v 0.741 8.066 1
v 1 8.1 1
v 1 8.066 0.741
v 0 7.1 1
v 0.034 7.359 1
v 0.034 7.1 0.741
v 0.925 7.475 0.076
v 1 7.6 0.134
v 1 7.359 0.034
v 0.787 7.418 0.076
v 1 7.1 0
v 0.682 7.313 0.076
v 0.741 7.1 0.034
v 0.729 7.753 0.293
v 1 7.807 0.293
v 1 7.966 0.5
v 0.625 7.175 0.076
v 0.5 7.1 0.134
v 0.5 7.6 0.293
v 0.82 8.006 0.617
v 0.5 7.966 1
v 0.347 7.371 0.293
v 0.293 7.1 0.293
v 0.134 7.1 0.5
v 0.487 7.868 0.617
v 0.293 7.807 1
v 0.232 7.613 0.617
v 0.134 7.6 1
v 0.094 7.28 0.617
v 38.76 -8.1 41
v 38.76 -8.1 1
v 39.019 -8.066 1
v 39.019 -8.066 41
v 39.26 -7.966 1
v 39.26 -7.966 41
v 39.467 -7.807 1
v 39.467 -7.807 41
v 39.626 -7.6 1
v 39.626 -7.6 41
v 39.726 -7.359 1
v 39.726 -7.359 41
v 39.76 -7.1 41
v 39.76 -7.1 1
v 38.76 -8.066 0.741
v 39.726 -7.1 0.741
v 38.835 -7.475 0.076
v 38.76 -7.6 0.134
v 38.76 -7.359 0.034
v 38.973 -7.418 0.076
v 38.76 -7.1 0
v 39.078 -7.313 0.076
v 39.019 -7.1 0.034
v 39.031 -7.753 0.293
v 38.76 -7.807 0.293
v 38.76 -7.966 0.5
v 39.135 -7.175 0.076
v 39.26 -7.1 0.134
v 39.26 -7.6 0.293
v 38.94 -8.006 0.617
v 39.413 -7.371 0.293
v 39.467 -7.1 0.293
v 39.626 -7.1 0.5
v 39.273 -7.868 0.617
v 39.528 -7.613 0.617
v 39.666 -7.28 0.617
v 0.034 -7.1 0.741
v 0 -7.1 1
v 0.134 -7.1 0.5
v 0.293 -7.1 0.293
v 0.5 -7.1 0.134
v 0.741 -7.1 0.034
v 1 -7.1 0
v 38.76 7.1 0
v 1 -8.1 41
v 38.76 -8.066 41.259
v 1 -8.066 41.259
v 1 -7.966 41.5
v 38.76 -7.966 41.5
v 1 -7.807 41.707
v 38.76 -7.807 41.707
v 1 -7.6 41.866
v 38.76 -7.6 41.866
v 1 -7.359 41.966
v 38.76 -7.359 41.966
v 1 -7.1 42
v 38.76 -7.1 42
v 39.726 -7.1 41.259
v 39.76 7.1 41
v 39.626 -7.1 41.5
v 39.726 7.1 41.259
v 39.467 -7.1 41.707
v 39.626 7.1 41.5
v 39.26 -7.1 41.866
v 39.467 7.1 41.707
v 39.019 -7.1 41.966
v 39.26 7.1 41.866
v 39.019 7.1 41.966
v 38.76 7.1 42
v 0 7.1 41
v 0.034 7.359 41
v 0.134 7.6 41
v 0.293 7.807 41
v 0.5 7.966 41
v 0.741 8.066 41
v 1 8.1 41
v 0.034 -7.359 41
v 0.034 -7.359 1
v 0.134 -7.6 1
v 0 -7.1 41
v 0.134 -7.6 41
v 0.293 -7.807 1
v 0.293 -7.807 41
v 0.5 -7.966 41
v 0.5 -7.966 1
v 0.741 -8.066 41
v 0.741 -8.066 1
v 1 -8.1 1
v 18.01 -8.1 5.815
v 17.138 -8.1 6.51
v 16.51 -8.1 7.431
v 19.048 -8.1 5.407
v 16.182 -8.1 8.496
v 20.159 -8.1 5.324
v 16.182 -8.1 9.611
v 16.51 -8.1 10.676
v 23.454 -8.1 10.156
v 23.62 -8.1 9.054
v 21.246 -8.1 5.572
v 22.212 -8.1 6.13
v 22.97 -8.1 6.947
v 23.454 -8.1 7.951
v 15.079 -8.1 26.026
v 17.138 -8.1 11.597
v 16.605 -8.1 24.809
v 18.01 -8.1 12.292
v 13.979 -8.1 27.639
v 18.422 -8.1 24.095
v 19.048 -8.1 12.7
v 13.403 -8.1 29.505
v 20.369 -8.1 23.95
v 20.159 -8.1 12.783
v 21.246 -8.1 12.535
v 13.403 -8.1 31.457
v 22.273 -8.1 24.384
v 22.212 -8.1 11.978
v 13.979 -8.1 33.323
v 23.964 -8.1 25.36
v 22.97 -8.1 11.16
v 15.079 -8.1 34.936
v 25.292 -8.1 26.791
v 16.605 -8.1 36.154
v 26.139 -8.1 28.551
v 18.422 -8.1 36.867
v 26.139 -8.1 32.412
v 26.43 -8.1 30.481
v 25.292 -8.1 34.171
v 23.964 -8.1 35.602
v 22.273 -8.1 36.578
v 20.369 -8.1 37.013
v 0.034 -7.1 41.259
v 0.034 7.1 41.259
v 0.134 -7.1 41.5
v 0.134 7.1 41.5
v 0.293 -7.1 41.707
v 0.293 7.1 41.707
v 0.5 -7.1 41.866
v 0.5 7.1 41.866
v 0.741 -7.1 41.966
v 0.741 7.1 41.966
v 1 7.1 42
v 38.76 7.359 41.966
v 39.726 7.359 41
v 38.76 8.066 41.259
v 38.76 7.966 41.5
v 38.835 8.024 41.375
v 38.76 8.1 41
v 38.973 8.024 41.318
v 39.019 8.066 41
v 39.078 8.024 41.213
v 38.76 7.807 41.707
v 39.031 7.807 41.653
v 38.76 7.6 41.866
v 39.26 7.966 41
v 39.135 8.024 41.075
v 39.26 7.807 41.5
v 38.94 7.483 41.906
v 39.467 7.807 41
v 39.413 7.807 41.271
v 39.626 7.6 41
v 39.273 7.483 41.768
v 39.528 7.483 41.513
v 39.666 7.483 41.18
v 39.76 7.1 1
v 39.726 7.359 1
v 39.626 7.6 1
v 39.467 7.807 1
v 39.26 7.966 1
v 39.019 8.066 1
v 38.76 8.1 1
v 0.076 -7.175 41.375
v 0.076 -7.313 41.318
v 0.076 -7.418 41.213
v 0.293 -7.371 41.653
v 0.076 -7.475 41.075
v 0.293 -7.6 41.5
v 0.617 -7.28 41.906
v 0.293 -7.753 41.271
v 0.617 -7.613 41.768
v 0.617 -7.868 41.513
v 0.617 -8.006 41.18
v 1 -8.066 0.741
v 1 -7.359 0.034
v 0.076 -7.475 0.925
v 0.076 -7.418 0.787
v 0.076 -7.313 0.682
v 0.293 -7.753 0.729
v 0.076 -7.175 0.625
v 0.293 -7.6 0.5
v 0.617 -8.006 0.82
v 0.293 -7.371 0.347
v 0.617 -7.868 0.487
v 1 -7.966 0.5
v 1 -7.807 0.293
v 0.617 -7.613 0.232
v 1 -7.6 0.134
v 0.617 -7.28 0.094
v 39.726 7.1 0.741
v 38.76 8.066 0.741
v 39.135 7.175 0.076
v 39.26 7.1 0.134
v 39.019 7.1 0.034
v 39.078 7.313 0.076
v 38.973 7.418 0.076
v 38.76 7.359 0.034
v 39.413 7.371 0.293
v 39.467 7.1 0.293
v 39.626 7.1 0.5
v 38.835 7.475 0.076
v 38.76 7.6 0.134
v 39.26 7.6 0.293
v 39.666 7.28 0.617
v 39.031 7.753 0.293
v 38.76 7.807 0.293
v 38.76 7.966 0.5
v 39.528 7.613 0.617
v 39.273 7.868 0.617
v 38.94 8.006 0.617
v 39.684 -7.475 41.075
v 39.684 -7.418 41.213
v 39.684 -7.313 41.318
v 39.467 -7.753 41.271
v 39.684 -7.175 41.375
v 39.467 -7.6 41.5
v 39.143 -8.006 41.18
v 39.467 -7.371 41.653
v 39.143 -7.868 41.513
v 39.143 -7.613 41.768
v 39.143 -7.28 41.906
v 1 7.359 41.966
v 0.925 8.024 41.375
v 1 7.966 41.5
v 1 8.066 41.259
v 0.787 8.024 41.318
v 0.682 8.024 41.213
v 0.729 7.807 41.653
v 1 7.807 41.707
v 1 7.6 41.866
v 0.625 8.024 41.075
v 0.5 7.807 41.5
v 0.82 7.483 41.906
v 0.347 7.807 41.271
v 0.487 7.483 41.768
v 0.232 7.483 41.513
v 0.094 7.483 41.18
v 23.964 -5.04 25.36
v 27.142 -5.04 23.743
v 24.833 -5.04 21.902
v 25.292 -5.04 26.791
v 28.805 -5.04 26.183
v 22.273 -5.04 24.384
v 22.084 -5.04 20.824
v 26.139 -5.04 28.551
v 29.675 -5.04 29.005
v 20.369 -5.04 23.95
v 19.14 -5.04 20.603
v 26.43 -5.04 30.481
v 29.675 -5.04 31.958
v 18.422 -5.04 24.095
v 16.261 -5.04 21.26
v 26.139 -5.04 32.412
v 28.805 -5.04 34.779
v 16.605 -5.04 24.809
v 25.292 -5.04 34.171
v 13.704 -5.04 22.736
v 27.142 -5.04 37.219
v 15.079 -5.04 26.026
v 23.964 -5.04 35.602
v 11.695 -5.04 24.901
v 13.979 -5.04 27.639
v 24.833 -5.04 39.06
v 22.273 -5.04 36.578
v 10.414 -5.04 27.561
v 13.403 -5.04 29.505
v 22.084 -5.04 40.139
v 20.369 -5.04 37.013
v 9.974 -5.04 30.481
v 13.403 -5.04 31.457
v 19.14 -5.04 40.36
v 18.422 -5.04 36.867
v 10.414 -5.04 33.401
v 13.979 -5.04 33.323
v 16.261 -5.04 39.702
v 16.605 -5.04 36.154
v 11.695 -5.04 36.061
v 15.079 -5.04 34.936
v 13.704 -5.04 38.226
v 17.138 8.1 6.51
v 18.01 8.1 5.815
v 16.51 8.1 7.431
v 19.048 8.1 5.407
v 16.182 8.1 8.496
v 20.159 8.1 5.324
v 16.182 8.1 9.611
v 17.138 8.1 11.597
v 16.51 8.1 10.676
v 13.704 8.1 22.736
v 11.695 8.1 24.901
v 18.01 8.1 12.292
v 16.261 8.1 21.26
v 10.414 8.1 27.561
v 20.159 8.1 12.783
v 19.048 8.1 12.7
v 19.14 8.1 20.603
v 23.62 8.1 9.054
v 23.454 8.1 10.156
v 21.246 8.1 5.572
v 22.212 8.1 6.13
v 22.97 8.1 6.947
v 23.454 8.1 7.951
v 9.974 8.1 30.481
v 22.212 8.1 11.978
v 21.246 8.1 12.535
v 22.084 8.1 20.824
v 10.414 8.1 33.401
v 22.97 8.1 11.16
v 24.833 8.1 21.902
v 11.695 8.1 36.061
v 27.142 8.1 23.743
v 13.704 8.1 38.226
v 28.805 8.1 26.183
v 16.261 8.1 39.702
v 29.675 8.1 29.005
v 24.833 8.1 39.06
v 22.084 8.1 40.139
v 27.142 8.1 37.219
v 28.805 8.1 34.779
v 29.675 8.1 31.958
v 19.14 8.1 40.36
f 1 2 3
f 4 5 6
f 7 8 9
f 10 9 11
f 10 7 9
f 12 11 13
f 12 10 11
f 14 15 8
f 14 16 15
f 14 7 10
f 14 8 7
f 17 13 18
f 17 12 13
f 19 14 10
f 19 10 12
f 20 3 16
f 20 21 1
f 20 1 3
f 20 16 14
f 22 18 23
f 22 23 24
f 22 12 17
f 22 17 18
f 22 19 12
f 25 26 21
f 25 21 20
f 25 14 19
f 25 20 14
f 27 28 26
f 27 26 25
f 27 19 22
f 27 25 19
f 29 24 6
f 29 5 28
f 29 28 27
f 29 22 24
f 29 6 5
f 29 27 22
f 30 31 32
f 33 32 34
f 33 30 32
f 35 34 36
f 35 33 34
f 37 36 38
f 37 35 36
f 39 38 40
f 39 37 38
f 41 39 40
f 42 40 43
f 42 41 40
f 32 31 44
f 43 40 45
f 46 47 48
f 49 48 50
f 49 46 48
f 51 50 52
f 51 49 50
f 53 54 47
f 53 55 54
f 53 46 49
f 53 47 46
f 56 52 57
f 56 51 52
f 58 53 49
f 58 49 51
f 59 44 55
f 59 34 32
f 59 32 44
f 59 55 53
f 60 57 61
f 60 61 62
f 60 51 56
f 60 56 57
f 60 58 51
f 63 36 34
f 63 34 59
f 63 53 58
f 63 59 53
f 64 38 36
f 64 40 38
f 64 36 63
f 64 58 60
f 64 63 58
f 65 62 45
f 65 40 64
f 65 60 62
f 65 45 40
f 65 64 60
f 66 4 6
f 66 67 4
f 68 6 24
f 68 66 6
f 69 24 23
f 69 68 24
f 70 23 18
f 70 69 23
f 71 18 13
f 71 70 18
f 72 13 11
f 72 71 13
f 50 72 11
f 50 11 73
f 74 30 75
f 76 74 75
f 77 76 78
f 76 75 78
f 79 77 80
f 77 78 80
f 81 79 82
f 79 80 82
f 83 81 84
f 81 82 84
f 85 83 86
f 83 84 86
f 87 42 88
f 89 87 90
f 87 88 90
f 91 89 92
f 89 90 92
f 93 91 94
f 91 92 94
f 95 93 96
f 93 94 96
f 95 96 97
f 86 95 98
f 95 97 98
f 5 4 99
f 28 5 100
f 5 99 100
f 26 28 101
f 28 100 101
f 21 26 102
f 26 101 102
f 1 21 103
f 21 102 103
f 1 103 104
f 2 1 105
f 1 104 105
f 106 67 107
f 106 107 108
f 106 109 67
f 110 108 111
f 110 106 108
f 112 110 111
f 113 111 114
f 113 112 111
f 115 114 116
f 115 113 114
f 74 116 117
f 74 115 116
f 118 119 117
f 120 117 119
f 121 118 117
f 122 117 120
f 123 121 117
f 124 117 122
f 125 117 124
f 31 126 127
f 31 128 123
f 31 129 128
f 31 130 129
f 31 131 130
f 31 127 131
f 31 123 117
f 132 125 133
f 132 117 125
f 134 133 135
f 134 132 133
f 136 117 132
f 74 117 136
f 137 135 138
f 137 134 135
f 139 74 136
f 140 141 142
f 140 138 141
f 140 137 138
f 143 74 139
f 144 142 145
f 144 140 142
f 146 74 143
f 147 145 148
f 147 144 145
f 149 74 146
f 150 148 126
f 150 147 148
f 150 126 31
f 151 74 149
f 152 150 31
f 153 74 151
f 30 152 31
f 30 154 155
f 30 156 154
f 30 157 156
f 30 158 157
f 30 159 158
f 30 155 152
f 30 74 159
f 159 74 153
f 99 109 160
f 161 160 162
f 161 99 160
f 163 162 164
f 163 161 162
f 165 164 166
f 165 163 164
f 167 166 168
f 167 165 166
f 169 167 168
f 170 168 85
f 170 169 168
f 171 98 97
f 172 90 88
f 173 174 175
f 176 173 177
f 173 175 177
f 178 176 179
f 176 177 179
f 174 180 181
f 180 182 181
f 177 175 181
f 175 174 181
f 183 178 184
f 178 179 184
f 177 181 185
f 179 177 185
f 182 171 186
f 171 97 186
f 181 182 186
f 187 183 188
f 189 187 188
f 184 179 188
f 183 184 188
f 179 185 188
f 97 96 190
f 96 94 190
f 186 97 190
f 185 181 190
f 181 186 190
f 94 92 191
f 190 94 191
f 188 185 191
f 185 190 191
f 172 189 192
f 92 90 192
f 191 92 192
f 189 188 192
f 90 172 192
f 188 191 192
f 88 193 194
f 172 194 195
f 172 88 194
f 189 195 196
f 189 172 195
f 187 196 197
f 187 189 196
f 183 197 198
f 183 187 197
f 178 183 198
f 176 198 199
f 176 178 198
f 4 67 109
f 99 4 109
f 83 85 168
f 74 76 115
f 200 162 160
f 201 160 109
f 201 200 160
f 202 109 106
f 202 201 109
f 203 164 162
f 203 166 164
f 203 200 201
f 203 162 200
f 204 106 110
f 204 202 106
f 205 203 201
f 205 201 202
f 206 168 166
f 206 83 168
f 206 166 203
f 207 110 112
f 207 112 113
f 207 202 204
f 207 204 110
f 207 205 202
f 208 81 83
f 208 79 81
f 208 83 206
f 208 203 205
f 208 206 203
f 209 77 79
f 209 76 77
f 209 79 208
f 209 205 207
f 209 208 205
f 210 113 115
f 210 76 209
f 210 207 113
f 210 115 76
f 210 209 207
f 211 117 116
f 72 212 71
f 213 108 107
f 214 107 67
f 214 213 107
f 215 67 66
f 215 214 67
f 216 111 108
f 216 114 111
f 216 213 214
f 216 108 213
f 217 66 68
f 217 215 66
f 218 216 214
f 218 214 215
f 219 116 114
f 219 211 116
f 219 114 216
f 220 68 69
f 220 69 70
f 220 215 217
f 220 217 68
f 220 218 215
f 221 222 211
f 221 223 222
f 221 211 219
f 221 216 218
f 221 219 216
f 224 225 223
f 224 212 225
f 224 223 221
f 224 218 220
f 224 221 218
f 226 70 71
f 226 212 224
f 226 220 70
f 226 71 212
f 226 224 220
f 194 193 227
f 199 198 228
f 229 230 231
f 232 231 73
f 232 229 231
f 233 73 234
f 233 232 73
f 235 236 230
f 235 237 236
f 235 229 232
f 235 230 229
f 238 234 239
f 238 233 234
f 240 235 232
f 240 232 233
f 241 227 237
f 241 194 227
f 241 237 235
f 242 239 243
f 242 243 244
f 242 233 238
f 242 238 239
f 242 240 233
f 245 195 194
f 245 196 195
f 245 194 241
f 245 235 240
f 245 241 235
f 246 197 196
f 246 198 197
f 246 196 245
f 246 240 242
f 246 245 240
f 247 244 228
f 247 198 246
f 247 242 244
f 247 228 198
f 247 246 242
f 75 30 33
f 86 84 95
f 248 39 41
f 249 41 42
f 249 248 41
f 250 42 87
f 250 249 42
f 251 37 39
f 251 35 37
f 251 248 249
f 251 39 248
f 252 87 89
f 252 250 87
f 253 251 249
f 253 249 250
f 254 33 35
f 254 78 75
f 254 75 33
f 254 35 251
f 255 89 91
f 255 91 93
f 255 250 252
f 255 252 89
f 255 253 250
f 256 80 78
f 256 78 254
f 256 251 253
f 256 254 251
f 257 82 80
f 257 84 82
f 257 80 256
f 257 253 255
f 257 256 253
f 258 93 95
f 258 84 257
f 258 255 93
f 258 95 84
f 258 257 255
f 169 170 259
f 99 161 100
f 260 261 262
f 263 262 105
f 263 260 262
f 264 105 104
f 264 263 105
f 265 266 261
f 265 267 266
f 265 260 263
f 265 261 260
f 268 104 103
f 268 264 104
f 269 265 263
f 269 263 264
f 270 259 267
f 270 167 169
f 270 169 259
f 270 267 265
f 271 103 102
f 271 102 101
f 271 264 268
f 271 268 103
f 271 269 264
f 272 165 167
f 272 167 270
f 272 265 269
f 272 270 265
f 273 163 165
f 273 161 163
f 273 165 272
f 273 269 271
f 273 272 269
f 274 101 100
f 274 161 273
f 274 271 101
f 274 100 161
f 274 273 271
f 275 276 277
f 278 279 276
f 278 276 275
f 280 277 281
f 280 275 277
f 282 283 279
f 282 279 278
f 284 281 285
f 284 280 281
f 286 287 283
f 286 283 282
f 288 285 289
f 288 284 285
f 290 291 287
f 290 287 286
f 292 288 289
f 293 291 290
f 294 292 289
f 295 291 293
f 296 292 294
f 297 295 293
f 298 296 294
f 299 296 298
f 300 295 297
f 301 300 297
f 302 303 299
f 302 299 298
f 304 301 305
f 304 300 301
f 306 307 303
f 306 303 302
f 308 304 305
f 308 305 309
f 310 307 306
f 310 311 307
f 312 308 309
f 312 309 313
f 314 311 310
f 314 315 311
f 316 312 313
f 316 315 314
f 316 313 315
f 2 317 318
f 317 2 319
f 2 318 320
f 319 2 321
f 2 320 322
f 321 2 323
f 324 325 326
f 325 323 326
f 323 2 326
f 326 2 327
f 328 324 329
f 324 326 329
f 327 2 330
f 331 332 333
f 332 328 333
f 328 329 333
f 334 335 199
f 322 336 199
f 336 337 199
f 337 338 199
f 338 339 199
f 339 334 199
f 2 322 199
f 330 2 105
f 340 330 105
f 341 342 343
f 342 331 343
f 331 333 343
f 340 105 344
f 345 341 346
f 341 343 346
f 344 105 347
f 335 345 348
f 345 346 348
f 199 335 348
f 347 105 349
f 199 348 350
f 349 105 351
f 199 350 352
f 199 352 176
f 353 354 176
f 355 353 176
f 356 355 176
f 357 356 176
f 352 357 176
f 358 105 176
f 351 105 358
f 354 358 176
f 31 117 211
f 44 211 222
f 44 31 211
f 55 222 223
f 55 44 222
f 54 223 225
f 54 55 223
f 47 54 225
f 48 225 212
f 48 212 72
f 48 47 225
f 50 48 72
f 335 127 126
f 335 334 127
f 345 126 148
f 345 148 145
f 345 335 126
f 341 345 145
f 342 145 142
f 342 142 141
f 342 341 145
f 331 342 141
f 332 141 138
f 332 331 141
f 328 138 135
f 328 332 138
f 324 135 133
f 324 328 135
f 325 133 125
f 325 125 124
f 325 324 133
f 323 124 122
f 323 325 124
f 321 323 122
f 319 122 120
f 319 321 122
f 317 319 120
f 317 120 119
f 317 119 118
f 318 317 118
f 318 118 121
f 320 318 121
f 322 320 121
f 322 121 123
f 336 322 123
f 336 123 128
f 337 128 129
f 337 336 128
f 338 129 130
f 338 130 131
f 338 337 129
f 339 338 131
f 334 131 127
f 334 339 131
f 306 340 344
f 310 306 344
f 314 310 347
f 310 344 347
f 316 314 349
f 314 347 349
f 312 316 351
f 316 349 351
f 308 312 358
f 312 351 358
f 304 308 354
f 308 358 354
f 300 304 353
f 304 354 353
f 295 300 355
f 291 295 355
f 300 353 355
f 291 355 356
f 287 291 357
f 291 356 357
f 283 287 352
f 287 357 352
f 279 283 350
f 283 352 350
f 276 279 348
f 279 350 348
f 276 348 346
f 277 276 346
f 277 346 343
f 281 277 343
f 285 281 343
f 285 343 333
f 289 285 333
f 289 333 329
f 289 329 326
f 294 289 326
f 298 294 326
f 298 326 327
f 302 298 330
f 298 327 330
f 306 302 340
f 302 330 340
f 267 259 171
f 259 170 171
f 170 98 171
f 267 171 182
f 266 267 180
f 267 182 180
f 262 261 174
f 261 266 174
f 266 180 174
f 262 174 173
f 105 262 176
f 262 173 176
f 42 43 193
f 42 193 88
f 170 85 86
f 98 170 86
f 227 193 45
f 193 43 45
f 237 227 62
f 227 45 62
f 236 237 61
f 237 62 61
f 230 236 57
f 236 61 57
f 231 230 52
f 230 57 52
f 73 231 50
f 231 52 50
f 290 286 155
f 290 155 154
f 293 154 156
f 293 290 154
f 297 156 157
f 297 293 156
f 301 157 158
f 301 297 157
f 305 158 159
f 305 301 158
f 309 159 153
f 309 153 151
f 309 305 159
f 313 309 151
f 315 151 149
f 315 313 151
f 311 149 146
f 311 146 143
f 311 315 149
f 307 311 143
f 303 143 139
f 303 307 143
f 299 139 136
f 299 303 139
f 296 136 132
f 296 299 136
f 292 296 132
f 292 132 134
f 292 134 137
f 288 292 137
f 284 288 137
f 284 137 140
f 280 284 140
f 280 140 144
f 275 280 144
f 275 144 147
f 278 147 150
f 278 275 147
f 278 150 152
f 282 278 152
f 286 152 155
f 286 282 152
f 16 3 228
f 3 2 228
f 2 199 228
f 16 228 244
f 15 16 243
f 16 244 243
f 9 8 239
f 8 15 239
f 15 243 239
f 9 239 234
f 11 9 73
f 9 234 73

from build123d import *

# Parameters (mm, degrees)
F0_W     = 39.76
F0_H     = 42
F0_R     = 3.74
F0_R_2   = 6.55
F1_DEPTH = 8.1
F2_R     = 9.906
F2_R_2   = 6.55
F3_DEPTH = 13.14
F4_R     = 1


with BuildPart() as f1:
    # F0 (on Front) → F1 (new body, symmetric)
    with BuildSketch(Plane.XZ):
        with Locations((19.88, 21)):
            Rectangle(F0_W, F0_H)
        with Locations((19.88, 9.053554)):
            Circle(F0_R, mode=Mode.SUBTRACT)
        with Locations((19.88, 30.481216)):
            Circle(F0_R_2, mode=Mode.SUBTRACT)
    extrude(amount=F1_DEPTH, both=True)

    # F2 (on face) → F3 (cut)
    with BuildSketch(Plane(origin=(0, 8.1, 0), x_dir=(-1, 0, 0), z_dir=(0, 1, 0))):
        with Locations((-19.88, 30.481216)):
            Circle(F2_R)
        with Locations((-19.88, 30.481216)):
            Circle(F2_R_2, mode=Mode.SUBTRACT)
    extrude(amount=-F3_DEPTH, mode=Mode.SUBTRACT)

    # F4
    f4_edges = [f1.edges().sort_by_distance(p)[0] for p in [
        (19.88, -8.1, 42),
        (39.76, -8.1, 21),
        (19.88, -8.1, 0),
        (39.76, 0, 42),
        (0, 0, 42),
        (19.88, 8.1, 42),
        (39.76, 8.1, 21),
        (39.76, 0, 0),
        (0, -8.1, 21),
        (0, 8.1, 21),
        (19.88, 8.1, 0),
        (0, 0, 0),
    ]]
    fillet(f4_edges, radius=F4_R)


solid = f1.part
